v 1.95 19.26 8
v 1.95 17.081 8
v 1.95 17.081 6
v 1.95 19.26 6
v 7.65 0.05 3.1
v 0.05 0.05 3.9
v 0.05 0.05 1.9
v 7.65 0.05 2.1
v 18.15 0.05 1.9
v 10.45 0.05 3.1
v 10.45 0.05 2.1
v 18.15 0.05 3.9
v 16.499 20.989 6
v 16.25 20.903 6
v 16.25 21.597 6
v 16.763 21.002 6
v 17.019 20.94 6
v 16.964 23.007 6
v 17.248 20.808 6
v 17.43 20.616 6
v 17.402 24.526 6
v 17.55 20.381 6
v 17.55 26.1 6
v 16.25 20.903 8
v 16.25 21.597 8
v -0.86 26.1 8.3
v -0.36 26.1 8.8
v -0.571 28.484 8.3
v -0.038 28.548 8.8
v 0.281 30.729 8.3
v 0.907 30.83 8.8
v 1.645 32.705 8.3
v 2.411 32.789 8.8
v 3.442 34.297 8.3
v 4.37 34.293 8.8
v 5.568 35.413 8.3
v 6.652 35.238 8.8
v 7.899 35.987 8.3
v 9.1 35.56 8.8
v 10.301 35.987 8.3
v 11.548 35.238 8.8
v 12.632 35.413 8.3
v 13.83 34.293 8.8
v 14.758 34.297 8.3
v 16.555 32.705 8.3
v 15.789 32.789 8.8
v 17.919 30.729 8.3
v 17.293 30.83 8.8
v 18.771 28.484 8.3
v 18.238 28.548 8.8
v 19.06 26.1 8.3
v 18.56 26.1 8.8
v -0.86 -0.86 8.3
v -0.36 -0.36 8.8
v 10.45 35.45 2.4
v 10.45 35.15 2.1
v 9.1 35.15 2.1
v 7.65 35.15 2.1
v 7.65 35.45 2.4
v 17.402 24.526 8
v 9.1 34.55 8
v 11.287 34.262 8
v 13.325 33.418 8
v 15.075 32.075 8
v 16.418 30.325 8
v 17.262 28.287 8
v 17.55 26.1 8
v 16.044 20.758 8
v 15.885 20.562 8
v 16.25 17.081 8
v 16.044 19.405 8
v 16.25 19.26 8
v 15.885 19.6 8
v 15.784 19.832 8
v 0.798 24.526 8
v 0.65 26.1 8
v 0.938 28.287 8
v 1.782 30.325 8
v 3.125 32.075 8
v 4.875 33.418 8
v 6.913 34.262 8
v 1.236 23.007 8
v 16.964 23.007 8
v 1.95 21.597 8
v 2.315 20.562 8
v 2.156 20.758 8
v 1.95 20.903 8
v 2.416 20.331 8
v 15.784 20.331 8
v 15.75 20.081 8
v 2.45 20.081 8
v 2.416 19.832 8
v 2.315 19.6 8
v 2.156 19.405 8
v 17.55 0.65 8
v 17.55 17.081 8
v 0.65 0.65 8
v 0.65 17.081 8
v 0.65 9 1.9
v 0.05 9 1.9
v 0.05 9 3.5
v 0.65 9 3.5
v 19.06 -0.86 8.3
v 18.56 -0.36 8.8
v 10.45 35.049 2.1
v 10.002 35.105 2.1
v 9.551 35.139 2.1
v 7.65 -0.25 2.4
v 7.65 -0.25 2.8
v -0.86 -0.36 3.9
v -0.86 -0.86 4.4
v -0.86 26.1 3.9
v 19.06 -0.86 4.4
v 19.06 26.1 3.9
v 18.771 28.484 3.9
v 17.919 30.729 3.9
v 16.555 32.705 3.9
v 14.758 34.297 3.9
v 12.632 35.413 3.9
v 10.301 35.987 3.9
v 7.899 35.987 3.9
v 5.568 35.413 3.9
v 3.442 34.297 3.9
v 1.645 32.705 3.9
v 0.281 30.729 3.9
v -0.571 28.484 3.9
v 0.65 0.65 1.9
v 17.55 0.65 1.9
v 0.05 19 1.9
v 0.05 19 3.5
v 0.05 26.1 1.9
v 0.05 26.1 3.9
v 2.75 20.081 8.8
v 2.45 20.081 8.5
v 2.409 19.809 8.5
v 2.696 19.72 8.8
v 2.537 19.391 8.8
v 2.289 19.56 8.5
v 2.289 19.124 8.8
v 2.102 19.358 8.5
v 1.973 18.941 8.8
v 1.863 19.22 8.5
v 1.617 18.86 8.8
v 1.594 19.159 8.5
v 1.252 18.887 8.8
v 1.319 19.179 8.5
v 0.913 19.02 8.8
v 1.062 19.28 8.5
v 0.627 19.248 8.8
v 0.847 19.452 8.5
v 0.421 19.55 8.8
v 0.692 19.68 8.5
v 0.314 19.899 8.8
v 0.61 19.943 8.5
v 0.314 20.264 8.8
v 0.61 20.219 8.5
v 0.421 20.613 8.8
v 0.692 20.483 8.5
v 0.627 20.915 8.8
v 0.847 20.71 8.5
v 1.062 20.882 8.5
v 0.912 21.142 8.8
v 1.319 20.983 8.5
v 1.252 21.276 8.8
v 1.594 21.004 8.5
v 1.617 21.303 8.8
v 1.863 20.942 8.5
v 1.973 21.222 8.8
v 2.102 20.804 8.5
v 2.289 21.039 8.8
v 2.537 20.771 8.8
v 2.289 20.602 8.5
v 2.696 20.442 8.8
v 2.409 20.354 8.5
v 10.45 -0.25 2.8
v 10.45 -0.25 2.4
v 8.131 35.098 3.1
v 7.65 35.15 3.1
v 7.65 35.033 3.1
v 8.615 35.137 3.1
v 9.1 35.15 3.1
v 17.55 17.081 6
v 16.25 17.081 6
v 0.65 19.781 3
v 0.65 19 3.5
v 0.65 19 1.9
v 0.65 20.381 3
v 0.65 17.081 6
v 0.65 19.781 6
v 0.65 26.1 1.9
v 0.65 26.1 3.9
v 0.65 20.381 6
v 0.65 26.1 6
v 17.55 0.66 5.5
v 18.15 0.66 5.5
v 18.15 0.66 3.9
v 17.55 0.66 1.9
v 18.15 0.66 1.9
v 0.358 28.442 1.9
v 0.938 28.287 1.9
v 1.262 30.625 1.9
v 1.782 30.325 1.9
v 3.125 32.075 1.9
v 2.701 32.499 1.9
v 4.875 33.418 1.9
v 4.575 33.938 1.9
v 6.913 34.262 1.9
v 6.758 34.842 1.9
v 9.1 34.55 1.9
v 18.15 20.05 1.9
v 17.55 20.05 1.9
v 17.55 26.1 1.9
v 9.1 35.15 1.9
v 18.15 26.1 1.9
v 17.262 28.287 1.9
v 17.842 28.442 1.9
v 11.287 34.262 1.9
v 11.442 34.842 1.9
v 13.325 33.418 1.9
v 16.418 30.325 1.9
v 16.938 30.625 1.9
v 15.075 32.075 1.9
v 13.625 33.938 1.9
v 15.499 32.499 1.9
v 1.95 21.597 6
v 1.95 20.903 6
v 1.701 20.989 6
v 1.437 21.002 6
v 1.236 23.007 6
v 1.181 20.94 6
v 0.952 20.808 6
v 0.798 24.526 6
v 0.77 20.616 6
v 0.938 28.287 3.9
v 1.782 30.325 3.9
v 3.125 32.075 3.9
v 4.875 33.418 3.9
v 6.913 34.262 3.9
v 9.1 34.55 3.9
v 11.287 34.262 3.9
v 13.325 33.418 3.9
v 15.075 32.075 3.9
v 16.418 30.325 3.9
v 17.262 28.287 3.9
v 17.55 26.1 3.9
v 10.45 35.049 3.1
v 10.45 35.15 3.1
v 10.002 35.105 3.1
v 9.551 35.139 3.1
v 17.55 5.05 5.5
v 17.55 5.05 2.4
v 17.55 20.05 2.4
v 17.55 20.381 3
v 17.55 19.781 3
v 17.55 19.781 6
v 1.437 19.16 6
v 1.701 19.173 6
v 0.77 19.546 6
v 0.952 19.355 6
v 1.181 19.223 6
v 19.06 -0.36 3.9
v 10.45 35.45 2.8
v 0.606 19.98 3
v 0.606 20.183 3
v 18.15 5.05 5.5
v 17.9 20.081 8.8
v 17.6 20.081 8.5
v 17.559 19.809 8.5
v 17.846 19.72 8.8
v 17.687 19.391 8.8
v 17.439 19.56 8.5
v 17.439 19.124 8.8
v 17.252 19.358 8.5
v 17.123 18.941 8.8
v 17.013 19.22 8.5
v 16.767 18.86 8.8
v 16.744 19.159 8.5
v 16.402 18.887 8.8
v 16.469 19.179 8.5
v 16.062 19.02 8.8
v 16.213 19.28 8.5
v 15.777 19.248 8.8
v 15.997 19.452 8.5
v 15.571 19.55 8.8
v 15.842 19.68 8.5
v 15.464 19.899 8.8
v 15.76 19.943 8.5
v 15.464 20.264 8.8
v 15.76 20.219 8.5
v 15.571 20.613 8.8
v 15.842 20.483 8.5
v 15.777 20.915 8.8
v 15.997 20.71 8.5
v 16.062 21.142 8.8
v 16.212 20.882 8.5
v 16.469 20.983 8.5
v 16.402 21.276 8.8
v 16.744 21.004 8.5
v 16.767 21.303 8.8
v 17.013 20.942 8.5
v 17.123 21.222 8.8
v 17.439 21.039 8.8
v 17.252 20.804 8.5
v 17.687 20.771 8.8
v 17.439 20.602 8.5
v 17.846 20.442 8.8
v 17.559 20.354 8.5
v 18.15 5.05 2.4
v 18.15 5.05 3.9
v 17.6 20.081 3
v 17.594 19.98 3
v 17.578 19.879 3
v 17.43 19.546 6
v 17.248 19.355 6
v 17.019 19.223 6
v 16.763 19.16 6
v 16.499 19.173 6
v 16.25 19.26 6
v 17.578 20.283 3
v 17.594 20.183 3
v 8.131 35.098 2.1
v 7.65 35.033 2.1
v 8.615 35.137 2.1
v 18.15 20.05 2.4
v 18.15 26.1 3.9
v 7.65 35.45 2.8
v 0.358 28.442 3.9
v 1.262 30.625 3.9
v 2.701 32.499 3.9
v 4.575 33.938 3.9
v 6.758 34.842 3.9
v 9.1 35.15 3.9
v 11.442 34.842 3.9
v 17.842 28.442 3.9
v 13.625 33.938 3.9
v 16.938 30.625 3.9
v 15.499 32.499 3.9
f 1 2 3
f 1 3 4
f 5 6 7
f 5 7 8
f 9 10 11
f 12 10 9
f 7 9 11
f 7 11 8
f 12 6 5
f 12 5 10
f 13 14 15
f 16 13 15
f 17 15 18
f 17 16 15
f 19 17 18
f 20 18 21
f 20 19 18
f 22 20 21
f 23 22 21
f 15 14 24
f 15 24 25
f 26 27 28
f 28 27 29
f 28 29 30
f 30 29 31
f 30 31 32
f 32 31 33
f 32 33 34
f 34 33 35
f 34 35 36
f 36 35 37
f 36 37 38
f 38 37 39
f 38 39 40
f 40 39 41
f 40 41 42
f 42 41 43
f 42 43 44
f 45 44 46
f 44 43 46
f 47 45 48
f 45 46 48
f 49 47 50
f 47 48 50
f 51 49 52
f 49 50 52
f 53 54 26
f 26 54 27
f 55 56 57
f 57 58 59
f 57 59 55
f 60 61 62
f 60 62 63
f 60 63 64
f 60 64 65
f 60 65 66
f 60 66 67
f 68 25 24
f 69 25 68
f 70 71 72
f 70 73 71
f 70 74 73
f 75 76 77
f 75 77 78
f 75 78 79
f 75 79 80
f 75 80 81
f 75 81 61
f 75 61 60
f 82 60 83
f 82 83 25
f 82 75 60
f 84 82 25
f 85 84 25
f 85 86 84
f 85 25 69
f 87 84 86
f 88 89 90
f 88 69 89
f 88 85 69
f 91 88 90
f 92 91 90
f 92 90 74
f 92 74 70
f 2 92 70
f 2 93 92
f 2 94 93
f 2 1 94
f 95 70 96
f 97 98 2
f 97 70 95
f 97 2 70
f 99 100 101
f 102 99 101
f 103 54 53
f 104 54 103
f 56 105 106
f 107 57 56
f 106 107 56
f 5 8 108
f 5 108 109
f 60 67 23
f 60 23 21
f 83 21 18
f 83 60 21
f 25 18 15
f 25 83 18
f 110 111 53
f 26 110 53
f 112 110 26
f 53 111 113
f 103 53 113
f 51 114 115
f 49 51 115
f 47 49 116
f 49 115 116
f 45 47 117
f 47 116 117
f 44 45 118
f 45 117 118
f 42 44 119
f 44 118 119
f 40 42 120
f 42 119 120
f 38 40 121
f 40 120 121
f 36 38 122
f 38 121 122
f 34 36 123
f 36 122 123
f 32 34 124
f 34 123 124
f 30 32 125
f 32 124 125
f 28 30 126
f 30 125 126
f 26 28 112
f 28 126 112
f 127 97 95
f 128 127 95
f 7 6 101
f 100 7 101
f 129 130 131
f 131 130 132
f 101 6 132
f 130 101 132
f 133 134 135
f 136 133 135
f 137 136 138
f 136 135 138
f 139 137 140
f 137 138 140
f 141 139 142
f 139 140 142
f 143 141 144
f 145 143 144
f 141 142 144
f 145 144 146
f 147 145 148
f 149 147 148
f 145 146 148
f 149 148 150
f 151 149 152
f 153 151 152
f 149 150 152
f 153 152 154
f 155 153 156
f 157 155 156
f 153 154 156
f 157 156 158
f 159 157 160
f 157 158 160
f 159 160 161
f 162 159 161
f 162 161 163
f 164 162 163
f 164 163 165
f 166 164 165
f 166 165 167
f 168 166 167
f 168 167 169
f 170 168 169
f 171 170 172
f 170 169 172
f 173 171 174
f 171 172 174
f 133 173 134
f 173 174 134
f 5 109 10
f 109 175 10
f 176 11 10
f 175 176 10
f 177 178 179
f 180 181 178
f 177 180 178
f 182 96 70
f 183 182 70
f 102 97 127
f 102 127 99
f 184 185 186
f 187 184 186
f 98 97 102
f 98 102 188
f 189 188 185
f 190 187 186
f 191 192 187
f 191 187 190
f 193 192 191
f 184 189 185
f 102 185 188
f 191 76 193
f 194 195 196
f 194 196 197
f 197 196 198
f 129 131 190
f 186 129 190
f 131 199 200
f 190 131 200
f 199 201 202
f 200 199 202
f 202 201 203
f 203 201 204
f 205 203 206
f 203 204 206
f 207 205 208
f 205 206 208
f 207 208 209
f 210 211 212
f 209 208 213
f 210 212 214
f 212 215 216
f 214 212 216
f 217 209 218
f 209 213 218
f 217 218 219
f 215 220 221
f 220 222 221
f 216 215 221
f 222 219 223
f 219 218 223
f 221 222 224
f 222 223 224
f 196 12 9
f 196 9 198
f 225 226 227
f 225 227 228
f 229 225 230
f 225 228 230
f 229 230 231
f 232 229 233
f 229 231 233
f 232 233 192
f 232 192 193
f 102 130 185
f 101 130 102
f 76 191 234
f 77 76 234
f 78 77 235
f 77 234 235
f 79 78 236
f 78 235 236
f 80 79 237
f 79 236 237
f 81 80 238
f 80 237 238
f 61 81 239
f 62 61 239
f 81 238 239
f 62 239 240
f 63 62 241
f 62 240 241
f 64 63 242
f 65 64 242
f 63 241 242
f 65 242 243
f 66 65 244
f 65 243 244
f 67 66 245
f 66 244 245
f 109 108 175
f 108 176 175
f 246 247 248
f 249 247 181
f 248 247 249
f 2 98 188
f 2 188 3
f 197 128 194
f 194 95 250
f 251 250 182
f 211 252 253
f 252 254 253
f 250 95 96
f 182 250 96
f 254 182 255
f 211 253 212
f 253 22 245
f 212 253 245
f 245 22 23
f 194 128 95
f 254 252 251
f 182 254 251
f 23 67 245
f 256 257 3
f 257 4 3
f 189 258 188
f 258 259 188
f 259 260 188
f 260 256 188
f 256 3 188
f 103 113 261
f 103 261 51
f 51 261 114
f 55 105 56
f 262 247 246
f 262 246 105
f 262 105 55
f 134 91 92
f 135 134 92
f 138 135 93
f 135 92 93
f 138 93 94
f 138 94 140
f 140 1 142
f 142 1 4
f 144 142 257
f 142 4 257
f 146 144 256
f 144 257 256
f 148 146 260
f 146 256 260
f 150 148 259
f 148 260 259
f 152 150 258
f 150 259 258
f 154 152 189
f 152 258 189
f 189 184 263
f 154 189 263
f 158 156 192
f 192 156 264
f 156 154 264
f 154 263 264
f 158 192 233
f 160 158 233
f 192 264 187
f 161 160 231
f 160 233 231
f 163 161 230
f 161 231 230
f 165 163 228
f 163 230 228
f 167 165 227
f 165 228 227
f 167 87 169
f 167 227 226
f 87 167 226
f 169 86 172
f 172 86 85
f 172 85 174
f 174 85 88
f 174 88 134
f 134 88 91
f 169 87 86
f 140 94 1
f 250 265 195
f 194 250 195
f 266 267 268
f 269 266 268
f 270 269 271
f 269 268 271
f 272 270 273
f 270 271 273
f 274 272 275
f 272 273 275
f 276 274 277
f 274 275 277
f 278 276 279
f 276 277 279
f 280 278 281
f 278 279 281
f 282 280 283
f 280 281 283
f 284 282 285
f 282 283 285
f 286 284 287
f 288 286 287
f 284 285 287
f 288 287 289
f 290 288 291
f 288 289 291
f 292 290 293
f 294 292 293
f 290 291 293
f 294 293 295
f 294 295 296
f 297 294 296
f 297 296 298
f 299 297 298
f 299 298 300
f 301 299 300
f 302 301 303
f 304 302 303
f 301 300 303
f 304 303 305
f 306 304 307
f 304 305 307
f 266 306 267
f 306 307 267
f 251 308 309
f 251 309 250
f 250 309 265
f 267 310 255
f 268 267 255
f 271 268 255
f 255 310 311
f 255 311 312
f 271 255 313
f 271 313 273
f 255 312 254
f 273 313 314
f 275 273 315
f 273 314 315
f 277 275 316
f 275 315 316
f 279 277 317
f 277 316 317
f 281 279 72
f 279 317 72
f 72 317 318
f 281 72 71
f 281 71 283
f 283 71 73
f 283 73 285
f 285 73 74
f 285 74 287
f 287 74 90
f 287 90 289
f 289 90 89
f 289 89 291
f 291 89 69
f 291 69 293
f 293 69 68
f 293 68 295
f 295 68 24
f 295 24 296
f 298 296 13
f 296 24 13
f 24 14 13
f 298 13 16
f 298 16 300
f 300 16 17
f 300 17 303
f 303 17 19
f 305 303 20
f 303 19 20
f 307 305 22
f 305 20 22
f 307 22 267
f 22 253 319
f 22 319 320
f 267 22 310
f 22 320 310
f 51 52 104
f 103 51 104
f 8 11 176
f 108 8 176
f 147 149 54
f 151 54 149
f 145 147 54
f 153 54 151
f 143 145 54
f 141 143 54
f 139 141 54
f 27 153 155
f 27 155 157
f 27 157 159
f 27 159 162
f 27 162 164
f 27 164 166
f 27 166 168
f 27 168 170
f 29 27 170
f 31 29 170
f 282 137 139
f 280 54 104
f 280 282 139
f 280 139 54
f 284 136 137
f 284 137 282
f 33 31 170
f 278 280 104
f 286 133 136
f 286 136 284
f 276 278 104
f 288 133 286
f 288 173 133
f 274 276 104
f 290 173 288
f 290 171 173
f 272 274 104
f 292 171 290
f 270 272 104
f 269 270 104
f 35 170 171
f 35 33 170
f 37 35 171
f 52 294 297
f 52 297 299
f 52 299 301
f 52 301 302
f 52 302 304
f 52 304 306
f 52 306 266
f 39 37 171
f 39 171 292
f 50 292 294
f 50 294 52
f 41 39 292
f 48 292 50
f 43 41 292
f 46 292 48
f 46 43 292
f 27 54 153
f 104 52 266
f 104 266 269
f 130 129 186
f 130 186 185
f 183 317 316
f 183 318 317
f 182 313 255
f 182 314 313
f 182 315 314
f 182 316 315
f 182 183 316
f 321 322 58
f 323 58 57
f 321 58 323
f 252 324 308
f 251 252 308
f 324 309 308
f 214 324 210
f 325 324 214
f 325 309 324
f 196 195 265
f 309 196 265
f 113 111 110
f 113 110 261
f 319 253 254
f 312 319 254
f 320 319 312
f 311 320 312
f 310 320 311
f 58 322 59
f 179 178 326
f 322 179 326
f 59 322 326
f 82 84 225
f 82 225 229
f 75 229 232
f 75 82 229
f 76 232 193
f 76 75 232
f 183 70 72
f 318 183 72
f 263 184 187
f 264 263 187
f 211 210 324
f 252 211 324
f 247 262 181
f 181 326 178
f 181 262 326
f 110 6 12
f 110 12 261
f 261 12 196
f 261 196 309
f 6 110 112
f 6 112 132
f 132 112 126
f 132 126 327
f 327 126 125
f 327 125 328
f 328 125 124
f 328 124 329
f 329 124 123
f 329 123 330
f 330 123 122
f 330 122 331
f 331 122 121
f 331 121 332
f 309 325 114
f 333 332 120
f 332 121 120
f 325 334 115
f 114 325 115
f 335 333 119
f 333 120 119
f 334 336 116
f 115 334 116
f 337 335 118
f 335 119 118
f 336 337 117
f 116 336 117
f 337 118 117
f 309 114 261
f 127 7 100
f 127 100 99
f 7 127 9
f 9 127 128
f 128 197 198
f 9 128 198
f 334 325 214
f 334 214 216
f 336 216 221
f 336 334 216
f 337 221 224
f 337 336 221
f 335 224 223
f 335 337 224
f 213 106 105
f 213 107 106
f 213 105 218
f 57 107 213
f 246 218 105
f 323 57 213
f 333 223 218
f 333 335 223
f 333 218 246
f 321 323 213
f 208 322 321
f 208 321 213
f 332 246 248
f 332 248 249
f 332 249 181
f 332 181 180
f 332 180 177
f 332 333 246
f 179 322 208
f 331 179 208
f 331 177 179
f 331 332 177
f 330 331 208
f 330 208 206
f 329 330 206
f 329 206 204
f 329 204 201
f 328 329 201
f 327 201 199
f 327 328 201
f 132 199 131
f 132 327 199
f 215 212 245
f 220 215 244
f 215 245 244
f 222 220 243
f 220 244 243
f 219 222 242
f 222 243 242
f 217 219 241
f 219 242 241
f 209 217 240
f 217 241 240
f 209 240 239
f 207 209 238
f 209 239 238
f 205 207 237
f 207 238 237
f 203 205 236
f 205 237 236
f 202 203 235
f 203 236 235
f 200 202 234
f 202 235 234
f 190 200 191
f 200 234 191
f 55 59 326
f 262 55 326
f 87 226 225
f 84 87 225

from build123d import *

# Parameters (mm, degrees)
PAD002_DEPTH    = 2
PAD003_DEPTH    = 4.9
POCKET005_DEPTH = 4.1
POCKET006_DEPTH = 11
SKETCH011_W     = 10
SKETCH011_H     = 3.5
POCKET007_DEPTH = 5
PAD004_DEPTH    = 1.4
PAD006_DEPTH    = 2
SKETCH013_R     = 0.925
POCKET009_DEPTH = 5
CHAMFER_SIZE    = 0.5
CHAMFER001_SIZE = 0.5
CHAMFER006_SIZE = 0.3


with BuildPart() as part:
    # Sketch008 (on Face1 of ReferencePocket001) → Pad002 (new body)
    with BuildSketch(Plane.XY.offset(3.9)):
        with BuildLine():
            Line((0.05, 0.05), (18.15, 0.05))
            Line((18.15, 0.05), (18.15, 26.100026))
            ThreePointArc((18.15, 26.100026), (9.1, 35.150026), (0.05, 26.100026))
            Line((0.05, 0.05), (0.05, 26.100026))
        make_face()
        with BuildLine():
            Line((0.65, 0.65), (17.55, 0.65))
            Line((17.55, 0.65), (17.55, 26.100026))
            ThreePointArc((17.55, 26.100026), (9.1, 34.550026), (0.65, 26.100026))
            Line((0.65, 0.65), (0.65, 26.100026))
        make_face(mode=Mode.SUBTRACT)
    extrude(amount=-PAD002_DEPTH)

    # Sketch009 (on Face9 of Pad002) → Pad003 (join)
    with BuildSketch(Plane.XY.offset(3.9)):
        with BuildLine():
            Line((-0.86, -0.86), (19.06, -0.86))
            Line((19.06, -0.86), (19.06, 26.10003))
            ThreePointArc((19.06, 26.10003), (9.1, 36.060031), (-0.86, 26.100031))
            Line((-0.86, -0.86), (-0.86, 26.100031))
        make_face()
    extrude(amount=PAD003_DEPTH)

    # Pad003 Face16 → Pocket005 (cut)
    with BuildSketch(Plane(origin=(9.1, 16.748749, 3.9), x_dir=(0, -1, 0), z_dir=(0, 0, -1))):
        with BuildLine():
            Line((16.098749, 8.45), (-9.351278, 8.45))
            ThreePointArc((-9.351278, 8.45), (-17.801278, 0), (-9.351278, -8.45))
            Line((-9.351278, -8.45), (16.098749, -8.45))
            Line((16.098749, -8.45), (16.098749, 8.45))
        make_face()
    extrude(amount=-POCKET005_DEPTH, mode=Mode.SUBTRACT)

    # Sketch010 (on Face8 of Pocket005) → Pocket006 (cut)
    with BuildSketch(Plane.YZ.offset(18.15)):
        Polygon((0.66, 1.9), (5.05, 1.9), (20.05, 1.9), (20.05, 2.4), (5.05, 2.4), (5.05, 5.5), (0.66, 5.5), (0.66, 1.8), (0.05, 1.8), (0.05, 1.9), align=None)
    extrude(amount=-POCKET006_DEPTH, mode=Mode.SUBTRACT)

    # Sketch011 (on Face4 of Pad002) → Pocket007 (cut)
    with BuildSketch(Plane(origin=(0.05, 0, 0), x_dir=(0, -1, 0), z_dir=(-1, 0, 0))):
        with Locations((-14, 1.75)):
            Rectangle(SKETCH011_W, SKETCH011_H)
    extrude(amount=-POCKET007_DEPTH, mode=Mode.SUBTRACT)

    # Sketch012 (on Face4 of Pad002) → Pad004 (join, symmetric)
    with BuildSketch(Plane(origin=(9.05, 0, 0), x_dir=(0, -1, 0), z_dir=(-1, 0, 0))):
        Polygon((-0.05, 2.1), (0.25, 2.4), (0.25, 2.8), (-0.05, 3.1), align=None)
        Polygon((-35.450026, 2.4), (-35.450026, 2.8), (-35.150026, 3.1), (-34.650026, 3.1), (-34.650026, 2.1), (-35.150026, 2.1), align=None)
    extrude(amount=PAD004_DEPTH, both=True)

    # Sketch014 (on Face47 of Pad004) → Pad006 (join)
    with BuildSketch(Plane(origin=(0, 0, 8), x_dir=(1, 0, 0), z_dir=(0, 0, -1))):
        with BuildLine():
            Line((17.55, -26.100026), (17.55, -17.081305))
            Line((17.55, -17.081305), (16.25, -17.081305))
            Line((16.25, -17.081305), (16.25, -21.596694))
            ThreePointArc((17.55, -26.100026), (17.218497, -23.756418), (16.25, -21.596694))
        make_face()
        with BuildLine():
            Line((0.65, -26.100026), (0.65, -17.081305))
            Line((0.65, -17.081305), (1.95, -17.081305))
            Line((1.95, -17.081305), (1.95, -21.596694))
            ThreePointArc((1.95, -21.596694), (0.981503, -23.756418), (0.65, -26.100026))
        make_face()
    extrude(amount=PAD006_DEPTH)

    # Sketch013 (on Face20 of Pocket005) → Pocket009 (cut, symmetric)
    with BuildSketch(Plane(origin=(0, 0, 8), x_dir=(1, 0, 0), z_dir=(0, 0, -1))):
        with Locations((1.525, -20.081305)):
            Circle(SKETCH013_R)
        with Locations((16.675, -20.081305)):
            Circle(SKETCH013_R)
    extrude(amount=POCKET009_DEPTH, both=True, mode=Mode.SUBTRACT)

    # Chamfer
    chamfer_edges = [part.edges().sort_by_distance(p)[0] for p in [
        (9.1, -0.86, 3.9),
    ]]
    chamfer(chamfer_edges, length=CHAMFER_SIZE)

    # Chamfer001
    chamfer001_edges = [part.edges().sort_by_distance(p)[0] for p in [
        (-0.86, 12.620015, 8.8),
        (9.1, 36.060031, 8.8),
        (19.06, 12.620015, 8.8),
        (9.1, -0.86, 8.8),
    ]]
    chamfer(chamfer001_edges, length=CHAMFER001_SIZE)

    # Chamfer006
    chamfer006_edges = [part.edges().sort_by_distance(p)[0] for p in [
        (15.75, 20.081305, 8.8),
        (0.6, 20.081305, 8.8),
    ]]
    chamfer(chamfer006_edges, length=CHAMFER006_SIZE)


solid = part.part
